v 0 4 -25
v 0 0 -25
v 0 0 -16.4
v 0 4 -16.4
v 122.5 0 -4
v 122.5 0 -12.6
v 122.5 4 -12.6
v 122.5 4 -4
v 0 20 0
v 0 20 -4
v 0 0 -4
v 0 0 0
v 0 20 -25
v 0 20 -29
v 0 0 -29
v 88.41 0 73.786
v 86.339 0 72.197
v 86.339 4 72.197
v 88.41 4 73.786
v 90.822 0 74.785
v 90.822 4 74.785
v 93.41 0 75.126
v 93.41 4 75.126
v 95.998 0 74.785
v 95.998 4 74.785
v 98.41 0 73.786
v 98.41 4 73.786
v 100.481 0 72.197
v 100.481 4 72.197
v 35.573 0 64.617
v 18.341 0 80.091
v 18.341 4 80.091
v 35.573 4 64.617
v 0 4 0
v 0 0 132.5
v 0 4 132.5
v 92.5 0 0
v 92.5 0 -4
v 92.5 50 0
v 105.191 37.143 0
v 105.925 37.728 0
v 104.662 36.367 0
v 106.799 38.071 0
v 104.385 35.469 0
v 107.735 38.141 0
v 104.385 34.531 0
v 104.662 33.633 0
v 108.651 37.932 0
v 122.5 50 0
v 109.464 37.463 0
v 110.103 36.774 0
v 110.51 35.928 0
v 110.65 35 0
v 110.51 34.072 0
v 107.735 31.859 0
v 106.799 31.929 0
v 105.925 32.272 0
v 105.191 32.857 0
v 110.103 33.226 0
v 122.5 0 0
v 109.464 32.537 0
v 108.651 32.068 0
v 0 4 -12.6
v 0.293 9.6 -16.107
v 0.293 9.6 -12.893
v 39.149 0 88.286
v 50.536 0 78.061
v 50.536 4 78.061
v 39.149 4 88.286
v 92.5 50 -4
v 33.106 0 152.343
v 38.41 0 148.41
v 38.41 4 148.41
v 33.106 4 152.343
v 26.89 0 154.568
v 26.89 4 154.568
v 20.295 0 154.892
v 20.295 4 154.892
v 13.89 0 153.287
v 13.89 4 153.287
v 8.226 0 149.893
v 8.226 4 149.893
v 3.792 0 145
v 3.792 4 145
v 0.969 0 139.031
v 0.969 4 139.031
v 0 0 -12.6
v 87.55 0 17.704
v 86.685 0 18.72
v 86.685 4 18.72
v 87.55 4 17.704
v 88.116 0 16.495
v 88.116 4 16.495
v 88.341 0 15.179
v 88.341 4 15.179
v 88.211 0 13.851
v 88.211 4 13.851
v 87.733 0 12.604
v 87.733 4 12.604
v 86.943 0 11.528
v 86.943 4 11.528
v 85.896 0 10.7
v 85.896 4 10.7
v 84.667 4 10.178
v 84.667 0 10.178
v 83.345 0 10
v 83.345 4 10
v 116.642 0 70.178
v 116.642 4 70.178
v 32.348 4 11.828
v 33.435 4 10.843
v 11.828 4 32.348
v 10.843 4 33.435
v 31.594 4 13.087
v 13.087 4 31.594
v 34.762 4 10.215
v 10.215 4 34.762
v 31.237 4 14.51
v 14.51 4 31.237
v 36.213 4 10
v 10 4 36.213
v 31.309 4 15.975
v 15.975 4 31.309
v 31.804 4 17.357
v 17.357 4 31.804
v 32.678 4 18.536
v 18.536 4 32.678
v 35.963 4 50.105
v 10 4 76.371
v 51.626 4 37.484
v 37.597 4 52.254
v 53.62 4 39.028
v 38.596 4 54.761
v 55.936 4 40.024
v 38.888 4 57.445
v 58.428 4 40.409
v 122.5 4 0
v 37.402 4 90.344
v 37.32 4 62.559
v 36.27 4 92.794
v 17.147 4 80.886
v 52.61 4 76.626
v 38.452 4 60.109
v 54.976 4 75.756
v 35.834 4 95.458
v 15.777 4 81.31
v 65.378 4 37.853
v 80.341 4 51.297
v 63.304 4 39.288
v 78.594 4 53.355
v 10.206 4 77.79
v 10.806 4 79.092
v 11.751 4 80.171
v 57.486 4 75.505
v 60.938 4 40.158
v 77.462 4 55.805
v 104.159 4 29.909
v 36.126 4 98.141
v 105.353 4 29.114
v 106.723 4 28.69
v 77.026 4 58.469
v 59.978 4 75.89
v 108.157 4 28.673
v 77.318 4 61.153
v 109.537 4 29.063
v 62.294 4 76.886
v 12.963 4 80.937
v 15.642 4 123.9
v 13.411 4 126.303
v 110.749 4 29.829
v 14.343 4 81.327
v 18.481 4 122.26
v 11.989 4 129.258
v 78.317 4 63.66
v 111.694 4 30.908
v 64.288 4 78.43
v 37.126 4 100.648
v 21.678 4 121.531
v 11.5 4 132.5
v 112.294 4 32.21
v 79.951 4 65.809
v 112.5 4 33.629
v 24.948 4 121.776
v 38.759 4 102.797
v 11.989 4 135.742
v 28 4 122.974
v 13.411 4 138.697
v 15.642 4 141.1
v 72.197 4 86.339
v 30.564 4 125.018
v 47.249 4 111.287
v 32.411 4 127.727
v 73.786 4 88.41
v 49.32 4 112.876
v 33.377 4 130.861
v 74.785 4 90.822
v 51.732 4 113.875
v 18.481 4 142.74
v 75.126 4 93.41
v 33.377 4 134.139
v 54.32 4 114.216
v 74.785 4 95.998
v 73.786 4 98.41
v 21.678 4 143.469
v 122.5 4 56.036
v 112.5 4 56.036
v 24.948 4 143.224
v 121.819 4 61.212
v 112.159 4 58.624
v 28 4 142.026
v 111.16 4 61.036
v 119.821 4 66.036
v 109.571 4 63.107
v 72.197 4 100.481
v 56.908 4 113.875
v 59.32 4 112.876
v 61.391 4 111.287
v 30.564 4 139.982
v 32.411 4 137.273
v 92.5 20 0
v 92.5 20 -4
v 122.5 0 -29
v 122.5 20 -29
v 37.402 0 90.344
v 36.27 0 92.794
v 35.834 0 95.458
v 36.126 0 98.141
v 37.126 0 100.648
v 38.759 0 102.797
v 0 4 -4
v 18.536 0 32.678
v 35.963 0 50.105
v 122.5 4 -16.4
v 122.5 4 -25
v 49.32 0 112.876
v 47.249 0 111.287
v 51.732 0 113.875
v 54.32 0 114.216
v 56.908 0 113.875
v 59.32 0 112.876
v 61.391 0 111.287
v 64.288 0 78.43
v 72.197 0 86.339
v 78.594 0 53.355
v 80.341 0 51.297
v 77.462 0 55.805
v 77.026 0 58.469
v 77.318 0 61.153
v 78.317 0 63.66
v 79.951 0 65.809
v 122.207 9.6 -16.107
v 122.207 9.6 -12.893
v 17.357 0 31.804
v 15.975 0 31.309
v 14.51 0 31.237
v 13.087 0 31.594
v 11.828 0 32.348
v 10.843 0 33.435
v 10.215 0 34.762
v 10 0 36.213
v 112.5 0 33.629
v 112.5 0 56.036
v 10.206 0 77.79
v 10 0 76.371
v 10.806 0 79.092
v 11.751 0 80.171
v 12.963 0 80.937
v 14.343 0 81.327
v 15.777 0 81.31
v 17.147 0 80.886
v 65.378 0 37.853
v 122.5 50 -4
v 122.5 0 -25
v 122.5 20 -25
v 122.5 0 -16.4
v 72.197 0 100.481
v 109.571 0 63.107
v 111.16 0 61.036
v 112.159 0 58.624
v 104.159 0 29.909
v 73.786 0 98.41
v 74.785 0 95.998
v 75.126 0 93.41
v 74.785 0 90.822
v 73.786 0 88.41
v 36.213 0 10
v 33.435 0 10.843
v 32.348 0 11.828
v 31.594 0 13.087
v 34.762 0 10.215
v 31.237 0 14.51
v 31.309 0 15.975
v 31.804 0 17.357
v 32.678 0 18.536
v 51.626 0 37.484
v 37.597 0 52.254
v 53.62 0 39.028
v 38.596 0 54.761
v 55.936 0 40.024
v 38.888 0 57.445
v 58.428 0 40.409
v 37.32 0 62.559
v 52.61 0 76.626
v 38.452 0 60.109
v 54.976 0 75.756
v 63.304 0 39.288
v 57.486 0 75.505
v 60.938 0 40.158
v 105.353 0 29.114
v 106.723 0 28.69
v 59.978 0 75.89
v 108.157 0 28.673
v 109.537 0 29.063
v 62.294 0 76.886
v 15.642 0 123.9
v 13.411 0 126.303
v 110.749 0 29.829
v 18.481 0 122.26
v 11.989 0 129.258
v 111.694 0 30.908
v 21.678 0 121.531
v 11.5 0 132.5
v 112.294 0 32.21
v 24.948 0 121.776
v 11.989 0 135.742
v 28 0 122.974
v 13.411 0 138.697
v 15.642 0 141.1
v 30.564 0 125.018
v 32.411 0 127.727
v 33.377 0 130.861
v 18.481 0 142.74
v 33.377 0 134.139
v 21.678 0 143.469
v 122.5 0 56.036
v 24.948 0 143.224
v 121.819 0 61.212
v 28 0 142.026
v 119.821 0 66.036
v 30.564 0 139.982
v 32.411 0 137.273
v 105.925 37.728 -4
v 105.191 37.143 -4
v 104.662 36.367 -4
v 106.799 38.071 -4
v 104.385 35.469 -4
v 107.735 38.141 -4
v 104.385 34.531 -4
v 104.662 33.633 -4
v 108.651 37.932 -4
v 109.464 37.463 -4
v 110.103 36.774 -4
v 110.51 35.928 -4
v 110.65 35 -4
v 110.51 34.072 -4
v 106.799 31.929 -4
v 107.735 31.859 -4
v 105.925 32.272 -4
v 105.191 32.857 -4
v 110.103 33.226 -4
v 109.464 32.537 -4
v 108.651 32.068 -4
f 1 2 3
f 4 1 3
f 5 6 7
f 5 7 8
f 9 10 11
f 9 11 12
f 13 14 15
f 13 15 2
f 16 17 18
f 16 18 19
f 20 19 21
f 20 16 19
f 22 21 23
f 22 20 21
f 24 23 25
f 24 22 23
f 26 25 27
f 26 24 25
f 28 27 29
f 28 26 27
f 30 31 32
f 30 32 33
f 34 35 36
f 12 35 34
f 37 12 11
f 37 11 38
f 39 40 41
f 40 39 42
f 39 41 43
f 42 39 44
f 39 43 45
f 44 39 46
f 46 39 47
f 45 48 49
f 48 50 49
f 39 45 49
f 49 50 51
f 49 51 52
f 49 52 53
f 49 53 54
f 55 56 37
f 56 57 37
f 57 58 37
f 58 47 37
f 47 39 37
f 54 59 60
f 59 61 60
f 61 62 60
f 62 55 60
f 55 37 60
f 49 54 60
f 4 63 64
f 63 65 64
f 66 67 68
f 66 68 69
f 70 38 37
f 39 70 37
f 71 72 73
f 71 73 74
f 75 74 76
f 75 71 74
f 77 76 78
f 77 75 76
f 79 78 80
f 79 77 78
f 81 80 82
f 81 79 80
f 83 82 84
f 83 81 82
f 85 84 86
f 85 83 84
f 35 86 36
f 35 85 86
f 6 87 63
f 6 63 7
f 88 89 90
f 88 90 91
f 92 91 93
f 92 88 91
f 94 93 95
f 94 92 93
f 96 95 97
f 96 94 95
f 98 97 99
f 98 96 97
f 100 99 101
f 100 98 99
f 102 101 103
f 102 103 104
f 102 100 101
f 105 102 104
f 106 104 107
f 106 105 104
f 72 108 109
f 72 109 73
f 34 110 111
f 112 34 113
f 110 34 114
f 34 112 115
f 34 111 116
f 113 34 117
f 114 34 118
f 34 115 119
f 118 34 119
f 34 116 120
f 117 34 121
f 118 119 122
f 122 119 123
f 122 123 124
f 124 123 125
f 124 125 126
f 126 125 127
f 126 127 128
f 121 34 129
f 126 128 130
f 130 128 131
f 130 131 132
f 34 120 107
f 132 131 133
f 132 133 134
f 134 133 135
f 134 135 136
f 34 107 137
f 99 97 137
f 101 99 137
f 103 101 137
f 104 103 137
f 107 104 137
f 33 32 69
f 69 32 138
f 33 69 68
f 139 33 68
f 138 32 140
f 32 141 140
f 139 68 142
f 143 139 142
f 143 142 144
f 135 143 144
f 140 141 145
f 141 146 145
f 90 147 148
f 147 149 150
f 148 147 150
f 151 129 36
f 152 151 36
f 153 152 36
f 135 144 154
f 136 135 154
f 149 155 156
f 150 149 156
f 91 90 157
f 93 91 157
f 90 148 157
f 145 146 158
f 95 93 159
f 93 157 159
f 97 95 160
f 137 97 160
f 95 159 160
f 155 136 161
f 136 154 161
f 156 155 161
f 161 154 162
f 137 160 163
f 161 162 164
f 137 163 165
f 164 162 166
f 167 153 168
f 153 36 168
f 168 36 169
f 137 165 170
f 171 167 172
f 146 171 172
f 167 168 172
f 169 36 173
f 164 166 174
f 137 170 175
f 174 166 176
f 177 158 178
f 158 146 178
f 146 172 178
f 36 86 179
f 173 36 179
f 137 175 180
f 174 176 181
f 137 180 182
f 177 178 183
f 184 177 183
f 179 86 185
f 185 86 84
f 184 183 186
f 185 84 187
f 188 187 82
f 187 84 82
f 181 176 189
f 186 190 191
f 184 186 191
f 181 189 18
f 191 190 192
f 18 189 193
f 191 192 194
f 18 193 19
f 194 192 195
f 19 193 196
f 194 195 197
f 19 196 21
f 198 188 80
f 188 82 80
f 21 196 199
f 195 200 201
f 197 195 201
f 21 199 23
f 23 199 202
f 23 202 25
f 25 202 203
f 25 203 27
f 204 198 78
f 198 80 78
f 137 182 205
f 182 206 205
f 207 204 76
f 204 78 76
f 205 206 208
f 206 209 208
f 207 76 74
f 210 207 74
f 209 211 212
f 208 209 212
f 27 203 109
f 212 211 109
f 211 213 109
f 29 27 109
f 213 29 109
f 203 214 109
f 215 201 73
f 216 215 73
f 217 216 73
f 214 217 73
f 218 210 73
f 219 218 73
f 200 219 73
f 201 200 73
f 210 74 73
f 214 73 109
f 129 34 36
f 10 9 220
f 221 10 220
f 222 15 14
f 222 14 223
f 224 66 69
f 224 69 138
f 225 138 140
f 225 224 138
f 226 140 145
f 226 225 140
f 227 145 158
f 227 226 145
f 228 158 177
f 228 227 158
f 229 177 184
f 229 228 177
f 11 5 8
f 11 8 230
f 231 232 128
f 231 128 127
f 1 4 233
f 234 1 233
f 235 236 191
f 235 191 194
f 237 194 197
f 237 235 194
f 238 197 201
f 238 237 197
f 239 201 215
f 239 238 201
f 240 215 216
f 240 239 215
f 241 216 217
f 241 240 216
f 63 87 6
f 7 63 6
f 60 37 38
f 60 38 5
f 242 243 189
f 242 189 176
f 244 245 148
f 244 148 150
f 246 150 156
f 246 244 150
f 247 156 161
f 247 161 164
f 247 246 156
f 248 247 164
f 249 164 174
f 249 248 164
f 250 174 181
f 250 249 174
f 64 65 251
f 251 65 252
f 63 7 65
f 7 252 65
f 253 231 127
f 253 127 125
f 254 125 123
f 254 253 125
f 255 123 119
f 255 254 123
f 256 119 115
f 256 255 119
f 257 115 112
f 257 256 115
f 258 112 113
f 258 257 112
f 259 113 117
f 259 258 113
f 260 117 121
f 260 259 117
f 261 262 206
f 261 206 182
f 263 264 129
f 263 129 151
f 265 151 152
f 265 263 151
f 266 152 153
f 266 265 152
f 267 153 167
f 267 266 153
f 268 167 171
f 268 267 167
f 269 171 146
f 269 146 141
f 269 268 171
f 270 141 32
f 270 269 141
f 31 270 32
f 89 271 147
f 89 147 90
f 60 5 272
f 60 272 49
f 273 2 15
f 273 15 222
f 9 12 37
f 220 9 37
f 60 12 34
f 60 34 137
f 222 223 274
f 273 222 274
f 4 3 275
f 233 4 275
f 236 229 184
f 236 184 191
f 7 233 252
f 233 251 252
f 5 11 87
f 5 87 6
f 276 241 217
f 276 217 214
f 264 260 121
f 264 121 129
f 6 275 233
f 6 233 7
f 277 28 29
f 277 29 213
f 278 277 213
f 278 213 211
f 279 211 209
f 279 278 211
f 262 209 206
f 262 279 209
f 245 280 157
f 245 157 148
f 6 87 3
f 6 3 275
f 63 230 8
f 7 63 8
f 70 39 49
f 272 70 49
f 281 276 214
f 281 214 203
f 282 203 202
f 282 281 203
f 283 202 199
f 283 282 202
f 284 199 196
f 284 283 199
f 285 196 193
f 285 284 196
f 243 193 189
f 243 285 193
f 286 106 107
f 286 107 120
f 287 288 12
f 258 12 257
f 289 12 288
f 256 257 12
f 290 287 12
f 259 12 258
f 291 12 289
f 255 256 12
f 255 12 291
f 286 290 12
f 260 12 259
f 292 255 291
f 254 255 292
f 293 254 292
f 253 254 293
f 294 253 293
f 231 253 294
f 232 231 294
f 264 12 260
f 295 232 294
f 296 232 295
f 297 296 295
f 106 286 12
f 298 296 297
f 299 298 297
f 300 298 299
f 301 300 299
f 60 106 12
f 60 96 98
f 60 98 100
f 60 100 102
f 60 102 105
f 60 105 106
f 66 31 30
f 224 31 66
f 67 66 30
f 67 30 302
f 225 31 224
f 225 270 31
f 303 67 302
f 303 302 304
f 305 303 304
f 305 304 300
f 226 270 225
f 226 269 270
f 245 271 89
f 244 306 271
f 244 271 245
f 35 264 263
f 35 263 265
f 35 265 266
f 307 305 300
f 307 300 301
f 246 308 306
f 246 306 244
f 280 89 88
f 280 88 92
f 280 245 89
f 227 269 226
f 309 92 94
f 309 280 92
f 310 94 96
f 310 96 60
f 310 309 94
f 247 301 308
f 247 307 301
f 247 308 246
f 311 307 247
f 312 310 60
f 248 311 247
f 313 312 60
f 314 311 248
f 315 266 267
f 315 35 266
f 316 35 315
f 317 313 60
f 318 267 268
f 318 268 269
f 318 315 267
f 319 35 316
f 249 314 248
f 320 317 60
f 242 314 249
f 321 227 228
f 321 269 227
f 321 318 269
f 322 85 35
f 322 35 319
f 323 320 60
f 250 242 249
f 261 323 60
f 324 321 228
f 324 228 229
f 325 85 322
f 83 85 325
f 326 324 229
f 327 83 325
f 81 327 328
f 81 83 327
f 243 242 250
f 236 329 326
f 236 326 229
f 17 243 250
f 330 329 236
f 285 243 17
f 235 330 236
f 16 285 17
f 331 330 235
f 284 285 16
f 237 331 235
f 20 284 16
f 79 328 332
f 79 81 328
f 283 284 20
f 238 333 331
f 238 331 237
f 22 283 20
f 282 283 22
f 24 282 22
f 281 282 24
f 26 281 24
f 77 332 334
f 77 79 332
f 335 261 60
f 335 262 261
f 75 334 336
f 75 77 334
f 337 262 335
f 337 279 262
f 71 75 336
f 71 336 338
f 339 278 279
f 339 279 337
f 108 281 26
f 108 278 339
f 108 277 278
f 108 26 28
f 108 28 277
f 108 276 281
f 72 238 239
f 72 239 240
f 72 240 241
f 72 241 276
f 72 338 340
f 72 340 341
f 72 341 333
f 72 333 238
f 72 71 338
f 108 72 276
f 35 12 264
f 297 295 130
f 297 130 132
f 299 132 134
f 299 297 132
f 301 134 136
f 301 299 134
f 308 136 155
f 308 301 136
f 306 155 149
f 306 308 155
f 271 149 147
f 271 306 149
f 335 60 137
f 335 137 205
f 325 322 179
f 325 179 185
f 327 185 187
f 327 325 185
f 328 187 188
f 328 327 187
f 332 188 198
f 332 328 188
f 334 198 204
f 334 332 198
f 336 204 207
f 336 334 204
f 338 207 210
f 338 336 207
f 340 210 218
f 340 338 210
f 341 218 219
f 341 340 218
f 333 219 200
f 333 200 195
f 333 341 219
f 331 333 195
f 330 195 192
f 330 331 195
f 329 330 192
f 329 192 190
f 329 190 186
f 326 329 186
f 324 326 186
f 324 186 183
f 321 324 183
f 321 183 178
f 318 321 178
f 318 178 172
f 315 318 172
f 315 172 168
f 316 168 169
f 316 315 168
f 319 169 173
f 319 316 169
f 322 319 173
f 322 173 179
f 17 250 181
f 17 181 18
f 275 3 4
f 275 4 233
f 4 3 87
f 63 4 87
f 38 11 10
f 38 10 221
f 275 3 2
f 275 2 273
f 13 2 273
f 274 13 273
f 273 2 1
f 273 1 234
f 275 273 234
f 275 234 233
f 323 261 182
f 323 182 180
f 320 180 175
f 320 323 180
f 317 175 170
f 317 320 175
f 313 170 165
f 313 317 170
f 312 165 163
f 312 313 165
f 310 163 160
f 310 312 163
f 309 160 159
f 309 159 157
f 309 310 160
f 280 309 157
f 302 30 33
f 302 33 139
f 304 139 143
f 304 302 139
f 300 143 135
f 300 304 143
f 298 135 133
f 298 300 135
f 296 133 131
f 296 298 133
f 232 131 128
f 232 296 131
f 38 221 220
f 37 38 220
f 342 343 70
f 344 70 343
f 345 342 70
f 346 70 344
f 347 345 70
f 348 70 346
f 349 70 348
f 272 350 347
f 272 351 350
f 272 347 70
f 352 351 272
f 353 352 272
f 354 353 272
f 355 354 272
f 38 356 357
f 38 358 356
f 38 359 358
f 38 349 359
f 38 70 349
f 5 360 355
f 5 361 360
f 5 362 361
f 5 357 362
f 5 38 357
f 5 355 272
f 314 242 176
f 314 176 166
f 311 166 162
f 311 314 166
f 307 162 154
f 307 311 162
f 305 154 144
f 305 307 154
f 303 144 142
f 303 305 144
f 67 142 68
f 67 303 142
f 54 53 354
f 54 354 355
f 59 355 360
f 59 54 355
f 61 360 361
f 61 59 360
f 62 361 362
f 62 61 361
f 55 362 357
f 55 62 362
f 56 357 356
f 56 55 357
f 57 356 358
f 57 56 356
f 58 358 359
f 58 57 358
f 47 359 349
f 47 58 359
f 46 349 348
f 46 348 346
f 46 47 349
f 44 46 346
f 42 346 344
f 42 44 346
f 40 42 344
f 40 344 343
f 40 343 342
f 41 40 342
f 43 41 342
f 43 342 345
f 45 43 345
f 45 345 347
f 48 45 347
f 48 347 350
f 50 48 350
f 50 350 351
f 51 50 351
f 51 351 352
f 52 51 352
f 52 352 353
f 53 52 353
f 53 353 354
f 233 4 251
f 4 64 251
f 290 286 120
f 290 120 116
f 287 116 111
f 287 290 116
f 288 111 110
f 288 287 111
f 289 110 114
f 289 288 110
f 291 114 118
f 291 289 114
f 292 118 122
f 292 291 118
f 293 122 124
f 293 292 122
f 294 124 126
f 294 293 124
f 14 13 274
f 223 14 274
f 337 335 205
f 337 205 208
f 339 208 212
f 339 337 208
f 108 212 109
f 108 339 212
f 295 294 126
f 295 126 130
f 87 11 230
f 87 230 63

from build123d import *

# Parameters (mm, degrees)
F1_DEPTH  = 4
F0_W      = 122.5
F0_H      = 8.6
F0_W_2    = 92.5
F0_H_2    = 4
F2_DEPTH  = 20
F0_W_3    = 30
F3_DEPTH  = 50
F0_H_3    = 3.8
F4_DEPTH  = 4
F5_R      = 3.15
F6_DEPTH  = 40
F4_FACE_W = 122.5
F4_FACE_H = 3.8
F7_DEPTH  = 5.6
F7_TAPER  = 3


with BuildPart() as f1:
    # F0 (on Front) → F1 (new body)
    with BuildSketch(Plane.XZ):
        with BuildLine():
            Line((0, 110), (0, 0))
            Line((0, 0), (92.5, 0))
            Line((92.5, 0), (122.5, 0))
            Line((122.5, 0), (122.5, 56.0355339059))
            ThreePointArc((122.5, 56.0355339059), (120.9775906502, 63.6892025532), (116.6421356237, 70.1776695297))
            Line((116.6421356237, 70.1776695297), (93.4099025767, 93.4099025767))
            Line((93.4099025767, 93.4099025767), (54.3198051534, 132.5))
            Line((54.3198051534, 132.5), (38.4099025767, 148.4099025767))
            ThreePointArc((38.4099025767, 148.4099025767), (13.8896227718, 153.2872894815), (0, 132.5))
            Line((0, 132.5), (0, 110))
        make_face()
        with BuildLine():
            ThreePointArc((35.5732162015, 64.6167222252), (38.8883564947, 57.4447614751), (35.9630302772, 50.105167298))
            Line((35.9630302772, 50.105167298), (18.5355348938, 32.6776719147))
            ThreePointArc((18.5355348938, 32.6776719147), (13.0865838261, 31.593808158), (10.0000009879, 36.2132058206))
            Line((10.0000009879, 36.2132058206), (10.0000009879, 76.3706396309))
            ThreePointArc((10.0000009879, 76.3706396309), (12.9632307923, 80.9369912566), (18.340627856, 80.0908831885))
            Line((18.340627856, 80.0908831885), (35.5732162015, 64.6167222252))
        make_face(mode=Mode.SUBTRACT)
        with BuildLine():
            ThreePointArc((51.6258270811, 37.4836914573), (58.4283685277, 40.4090176749), (65.3781486291, 37.8531107608))
            Line((65.3781486291, 37.8531107608), (86.6852052871, 18.7202435576))
            ThreePointArc((86.6852052871, 18.7202435576), (88.013690636, 13.2113158172), (83.3445784191, 10))
            Line((83.3445784191, 10), (36.2132034356, 10))
            ThreePointArc((36.2132034356, 10), (31.593805773, 13.0865828382), (32.6776695297, 18.5355339059))
            Line((32.6776695297, 18.5355339059), (51.6258270811, 37.4836914573))
        make_face(mode=Mode.SUBTRACT)
        with BuildLine():
            Line((112.5000011414, 56.0355339059), (112.5000011414, 33.6293555954))
            ThreePointArc((112.5000011414, 33.6293555954), (109.536771337, 29.0630039696), (104.1593742733, 29.9091120378))
            Line((104.1593742733, 29.9091120378), (80.3407591987, 51.2972561863))
            ThreePointArc((80.3407591987, 51.2972561863), (77.0256189055, 58.4692169364), (79.9509451231, 65.8088111135))
            Line((79.9509451231, 65.8088111135), (86.3388347648, 72.1967007552))
            ThreePointArc((86.3388347648, 72.1967007552), (93.4099025767, 75.1256329434), (100.4809703886, 72.1967007552))
            Line((100.4809703886, 72.1967007552), (109.5710686189, 63.1066025249))
            ThreePointArc((109.5710686189, 63.1066025249), (111.7387963796, 59.8623686664), (112.5000011414, 56.0355339059))
        make_face(mode=Mode.SUBTRACT)
        with BuildLine():
            Line((72.1966986753, 86.3388347648), (64.2881514014, 78.4302874909))
            ThreePointArc((64.2881514014, 78.4302874909), (57.4856099548, 75.5049612734), (50.5358298533, 78.0608681875))
            Line((50.5358298533, 78.0608681875), (39.1490457718, 88.285735526))
            ThreePointArc((39.1490457718, 88.285735526), (35.8339054785, 95.457696276), (38.7592316961, 102.7972904532))
            Line((38.7592316961, 102.7972904532), (47.2487373415, 111.2867960986))
            ThreePointArc((47.2487373415, 111.2867960986), (54.3198051534, 114.2157282867), (61.3908729653, 111.2867960986))
            Line((61.3908729653, 111.2867960986), (72.1966986753, 100.4809703886))
            ThreePointArc((72.1966986753, 100.4809703886), (75.1256308634, 93.4099025767), (72.1966986753, 86.3388347648))
        make_face(mode=Mode.SUBTRACT)
        with BuildLine():
            ThreePointArc((33.5, 132.5), (22.5, 121.5), (11.5, 132.5))
            ThreePointArc((11.5, 132.5), (22.5, 143.5), (33.5, 132.5))
        make_face(mode=Mode.SUBTRACT)
    extrude(amount=F1_DEPTH)


with BuildPart() as f1b:
    # F0 (on Front) → F1, piece 2 (new body)
    with BuildSketch(Plane.XZ):
        Polygon((92.5, -4), (0, -4), (0, -12.6), (122.5, -12.6), (122.5, -4), align=None)
    extrude(amount=F1_DEPTH)


with BuildPart() as f1c:
    # F0 (on Front) → F1, piece 3 (new body)
    with BuildSketch(Plane.XZ):
        with Locations((61.25, -20.7)):
            Rectangle(F0_W, F0_H)
    extrude(amount=F1_DEPTH)


with BuildPart() as f2:
    # F0 (on Front) → F2 (new body)
    with BuildSketch(Plane.XZ):
        with Locations((46.25, -2)):
            Rectangle(F0_W_2, F0_H_2)
    extrude(amount=F2_DEPTH)


with BuildPart() as f2b:
    # F0 (on Front) → F2, piece 2 (new body)
    with BuildSketch(Plane.XZ):
        with Locations((61.25, -27)):
            Rectangle(F0_W, F0_H_2)
    extrude(amount=F2_DEPTH)


with BuildPart() as f3:
    # F0 (on Front) → F3 (new body)
    with BuildSketch(Plane.XZ):
        with Locations((107.5, -2)):
            Rectangle(F0_W_3, F0_H_2)
    extrude(amount=F3_DEPTH)

    # F5 (on face) → F6 (cut)
    with BuildSketch(Plane.XY):
        with Locations((107.5, -35)):
            Circle(F5_R)
    extrude(amount=-F6_DEPTH, mode=Mode.SUBTRACT)


with BuildPart() as f4:
    # F0 (on Front) → F4 (new body)
    with BuildSketch(Plane.XZ):
        with Locations((61.25, -14.5)):
            Rectangle(F0_W, F0_H_3)
    extrude(amount=F4_DEPTH)

    # F4_face (on face) → F7 (join)
    with BuildSketch(Plane(origin=(61.25, -4, -14.5), x_dir=(1, 0, 0), z_dir=(0, -1, 0))):
        Rectangle(F4_FACE_W, F4_FACE_H)
    extrude(amount=F7_DEPTH, taper=F7_TAPER)


with BuildPart() as f8_1:
    # F8: instance of F4
    add(f4.part.mirror(Plane.XZ))


with BuildPart() as f8_2:
    # F8: instance of F1
    add(f1.part.mirror(Plane.XZ))


with BuildPart() as f8_3:
    # F8: instance of F1c
    add(f1c.part.mirror(Plane.XZ))


with BuildPart() as f8_4:
    # F8: instance of F2
    add(f2.part.mirror(Plane.XZ))


with BuildPart() as f8_5:
    # F8: instance of F3
    add(f3.part.mirror(Plane.XZ))


with BuildPart() as f8_6:
    # F8: instance of F1b
    add(f1b.part.mirror(Plane.XZ))


with BuildPart() as f8_7:
    # F8: instance of F2b
    add(f2b.part.mirror(Plane.XZ))


solid = Compound([f8_1.part, f8_2.part, f8_3.part, f8_4.part, f8_5.part, f8_6.part, f8_7.part])
